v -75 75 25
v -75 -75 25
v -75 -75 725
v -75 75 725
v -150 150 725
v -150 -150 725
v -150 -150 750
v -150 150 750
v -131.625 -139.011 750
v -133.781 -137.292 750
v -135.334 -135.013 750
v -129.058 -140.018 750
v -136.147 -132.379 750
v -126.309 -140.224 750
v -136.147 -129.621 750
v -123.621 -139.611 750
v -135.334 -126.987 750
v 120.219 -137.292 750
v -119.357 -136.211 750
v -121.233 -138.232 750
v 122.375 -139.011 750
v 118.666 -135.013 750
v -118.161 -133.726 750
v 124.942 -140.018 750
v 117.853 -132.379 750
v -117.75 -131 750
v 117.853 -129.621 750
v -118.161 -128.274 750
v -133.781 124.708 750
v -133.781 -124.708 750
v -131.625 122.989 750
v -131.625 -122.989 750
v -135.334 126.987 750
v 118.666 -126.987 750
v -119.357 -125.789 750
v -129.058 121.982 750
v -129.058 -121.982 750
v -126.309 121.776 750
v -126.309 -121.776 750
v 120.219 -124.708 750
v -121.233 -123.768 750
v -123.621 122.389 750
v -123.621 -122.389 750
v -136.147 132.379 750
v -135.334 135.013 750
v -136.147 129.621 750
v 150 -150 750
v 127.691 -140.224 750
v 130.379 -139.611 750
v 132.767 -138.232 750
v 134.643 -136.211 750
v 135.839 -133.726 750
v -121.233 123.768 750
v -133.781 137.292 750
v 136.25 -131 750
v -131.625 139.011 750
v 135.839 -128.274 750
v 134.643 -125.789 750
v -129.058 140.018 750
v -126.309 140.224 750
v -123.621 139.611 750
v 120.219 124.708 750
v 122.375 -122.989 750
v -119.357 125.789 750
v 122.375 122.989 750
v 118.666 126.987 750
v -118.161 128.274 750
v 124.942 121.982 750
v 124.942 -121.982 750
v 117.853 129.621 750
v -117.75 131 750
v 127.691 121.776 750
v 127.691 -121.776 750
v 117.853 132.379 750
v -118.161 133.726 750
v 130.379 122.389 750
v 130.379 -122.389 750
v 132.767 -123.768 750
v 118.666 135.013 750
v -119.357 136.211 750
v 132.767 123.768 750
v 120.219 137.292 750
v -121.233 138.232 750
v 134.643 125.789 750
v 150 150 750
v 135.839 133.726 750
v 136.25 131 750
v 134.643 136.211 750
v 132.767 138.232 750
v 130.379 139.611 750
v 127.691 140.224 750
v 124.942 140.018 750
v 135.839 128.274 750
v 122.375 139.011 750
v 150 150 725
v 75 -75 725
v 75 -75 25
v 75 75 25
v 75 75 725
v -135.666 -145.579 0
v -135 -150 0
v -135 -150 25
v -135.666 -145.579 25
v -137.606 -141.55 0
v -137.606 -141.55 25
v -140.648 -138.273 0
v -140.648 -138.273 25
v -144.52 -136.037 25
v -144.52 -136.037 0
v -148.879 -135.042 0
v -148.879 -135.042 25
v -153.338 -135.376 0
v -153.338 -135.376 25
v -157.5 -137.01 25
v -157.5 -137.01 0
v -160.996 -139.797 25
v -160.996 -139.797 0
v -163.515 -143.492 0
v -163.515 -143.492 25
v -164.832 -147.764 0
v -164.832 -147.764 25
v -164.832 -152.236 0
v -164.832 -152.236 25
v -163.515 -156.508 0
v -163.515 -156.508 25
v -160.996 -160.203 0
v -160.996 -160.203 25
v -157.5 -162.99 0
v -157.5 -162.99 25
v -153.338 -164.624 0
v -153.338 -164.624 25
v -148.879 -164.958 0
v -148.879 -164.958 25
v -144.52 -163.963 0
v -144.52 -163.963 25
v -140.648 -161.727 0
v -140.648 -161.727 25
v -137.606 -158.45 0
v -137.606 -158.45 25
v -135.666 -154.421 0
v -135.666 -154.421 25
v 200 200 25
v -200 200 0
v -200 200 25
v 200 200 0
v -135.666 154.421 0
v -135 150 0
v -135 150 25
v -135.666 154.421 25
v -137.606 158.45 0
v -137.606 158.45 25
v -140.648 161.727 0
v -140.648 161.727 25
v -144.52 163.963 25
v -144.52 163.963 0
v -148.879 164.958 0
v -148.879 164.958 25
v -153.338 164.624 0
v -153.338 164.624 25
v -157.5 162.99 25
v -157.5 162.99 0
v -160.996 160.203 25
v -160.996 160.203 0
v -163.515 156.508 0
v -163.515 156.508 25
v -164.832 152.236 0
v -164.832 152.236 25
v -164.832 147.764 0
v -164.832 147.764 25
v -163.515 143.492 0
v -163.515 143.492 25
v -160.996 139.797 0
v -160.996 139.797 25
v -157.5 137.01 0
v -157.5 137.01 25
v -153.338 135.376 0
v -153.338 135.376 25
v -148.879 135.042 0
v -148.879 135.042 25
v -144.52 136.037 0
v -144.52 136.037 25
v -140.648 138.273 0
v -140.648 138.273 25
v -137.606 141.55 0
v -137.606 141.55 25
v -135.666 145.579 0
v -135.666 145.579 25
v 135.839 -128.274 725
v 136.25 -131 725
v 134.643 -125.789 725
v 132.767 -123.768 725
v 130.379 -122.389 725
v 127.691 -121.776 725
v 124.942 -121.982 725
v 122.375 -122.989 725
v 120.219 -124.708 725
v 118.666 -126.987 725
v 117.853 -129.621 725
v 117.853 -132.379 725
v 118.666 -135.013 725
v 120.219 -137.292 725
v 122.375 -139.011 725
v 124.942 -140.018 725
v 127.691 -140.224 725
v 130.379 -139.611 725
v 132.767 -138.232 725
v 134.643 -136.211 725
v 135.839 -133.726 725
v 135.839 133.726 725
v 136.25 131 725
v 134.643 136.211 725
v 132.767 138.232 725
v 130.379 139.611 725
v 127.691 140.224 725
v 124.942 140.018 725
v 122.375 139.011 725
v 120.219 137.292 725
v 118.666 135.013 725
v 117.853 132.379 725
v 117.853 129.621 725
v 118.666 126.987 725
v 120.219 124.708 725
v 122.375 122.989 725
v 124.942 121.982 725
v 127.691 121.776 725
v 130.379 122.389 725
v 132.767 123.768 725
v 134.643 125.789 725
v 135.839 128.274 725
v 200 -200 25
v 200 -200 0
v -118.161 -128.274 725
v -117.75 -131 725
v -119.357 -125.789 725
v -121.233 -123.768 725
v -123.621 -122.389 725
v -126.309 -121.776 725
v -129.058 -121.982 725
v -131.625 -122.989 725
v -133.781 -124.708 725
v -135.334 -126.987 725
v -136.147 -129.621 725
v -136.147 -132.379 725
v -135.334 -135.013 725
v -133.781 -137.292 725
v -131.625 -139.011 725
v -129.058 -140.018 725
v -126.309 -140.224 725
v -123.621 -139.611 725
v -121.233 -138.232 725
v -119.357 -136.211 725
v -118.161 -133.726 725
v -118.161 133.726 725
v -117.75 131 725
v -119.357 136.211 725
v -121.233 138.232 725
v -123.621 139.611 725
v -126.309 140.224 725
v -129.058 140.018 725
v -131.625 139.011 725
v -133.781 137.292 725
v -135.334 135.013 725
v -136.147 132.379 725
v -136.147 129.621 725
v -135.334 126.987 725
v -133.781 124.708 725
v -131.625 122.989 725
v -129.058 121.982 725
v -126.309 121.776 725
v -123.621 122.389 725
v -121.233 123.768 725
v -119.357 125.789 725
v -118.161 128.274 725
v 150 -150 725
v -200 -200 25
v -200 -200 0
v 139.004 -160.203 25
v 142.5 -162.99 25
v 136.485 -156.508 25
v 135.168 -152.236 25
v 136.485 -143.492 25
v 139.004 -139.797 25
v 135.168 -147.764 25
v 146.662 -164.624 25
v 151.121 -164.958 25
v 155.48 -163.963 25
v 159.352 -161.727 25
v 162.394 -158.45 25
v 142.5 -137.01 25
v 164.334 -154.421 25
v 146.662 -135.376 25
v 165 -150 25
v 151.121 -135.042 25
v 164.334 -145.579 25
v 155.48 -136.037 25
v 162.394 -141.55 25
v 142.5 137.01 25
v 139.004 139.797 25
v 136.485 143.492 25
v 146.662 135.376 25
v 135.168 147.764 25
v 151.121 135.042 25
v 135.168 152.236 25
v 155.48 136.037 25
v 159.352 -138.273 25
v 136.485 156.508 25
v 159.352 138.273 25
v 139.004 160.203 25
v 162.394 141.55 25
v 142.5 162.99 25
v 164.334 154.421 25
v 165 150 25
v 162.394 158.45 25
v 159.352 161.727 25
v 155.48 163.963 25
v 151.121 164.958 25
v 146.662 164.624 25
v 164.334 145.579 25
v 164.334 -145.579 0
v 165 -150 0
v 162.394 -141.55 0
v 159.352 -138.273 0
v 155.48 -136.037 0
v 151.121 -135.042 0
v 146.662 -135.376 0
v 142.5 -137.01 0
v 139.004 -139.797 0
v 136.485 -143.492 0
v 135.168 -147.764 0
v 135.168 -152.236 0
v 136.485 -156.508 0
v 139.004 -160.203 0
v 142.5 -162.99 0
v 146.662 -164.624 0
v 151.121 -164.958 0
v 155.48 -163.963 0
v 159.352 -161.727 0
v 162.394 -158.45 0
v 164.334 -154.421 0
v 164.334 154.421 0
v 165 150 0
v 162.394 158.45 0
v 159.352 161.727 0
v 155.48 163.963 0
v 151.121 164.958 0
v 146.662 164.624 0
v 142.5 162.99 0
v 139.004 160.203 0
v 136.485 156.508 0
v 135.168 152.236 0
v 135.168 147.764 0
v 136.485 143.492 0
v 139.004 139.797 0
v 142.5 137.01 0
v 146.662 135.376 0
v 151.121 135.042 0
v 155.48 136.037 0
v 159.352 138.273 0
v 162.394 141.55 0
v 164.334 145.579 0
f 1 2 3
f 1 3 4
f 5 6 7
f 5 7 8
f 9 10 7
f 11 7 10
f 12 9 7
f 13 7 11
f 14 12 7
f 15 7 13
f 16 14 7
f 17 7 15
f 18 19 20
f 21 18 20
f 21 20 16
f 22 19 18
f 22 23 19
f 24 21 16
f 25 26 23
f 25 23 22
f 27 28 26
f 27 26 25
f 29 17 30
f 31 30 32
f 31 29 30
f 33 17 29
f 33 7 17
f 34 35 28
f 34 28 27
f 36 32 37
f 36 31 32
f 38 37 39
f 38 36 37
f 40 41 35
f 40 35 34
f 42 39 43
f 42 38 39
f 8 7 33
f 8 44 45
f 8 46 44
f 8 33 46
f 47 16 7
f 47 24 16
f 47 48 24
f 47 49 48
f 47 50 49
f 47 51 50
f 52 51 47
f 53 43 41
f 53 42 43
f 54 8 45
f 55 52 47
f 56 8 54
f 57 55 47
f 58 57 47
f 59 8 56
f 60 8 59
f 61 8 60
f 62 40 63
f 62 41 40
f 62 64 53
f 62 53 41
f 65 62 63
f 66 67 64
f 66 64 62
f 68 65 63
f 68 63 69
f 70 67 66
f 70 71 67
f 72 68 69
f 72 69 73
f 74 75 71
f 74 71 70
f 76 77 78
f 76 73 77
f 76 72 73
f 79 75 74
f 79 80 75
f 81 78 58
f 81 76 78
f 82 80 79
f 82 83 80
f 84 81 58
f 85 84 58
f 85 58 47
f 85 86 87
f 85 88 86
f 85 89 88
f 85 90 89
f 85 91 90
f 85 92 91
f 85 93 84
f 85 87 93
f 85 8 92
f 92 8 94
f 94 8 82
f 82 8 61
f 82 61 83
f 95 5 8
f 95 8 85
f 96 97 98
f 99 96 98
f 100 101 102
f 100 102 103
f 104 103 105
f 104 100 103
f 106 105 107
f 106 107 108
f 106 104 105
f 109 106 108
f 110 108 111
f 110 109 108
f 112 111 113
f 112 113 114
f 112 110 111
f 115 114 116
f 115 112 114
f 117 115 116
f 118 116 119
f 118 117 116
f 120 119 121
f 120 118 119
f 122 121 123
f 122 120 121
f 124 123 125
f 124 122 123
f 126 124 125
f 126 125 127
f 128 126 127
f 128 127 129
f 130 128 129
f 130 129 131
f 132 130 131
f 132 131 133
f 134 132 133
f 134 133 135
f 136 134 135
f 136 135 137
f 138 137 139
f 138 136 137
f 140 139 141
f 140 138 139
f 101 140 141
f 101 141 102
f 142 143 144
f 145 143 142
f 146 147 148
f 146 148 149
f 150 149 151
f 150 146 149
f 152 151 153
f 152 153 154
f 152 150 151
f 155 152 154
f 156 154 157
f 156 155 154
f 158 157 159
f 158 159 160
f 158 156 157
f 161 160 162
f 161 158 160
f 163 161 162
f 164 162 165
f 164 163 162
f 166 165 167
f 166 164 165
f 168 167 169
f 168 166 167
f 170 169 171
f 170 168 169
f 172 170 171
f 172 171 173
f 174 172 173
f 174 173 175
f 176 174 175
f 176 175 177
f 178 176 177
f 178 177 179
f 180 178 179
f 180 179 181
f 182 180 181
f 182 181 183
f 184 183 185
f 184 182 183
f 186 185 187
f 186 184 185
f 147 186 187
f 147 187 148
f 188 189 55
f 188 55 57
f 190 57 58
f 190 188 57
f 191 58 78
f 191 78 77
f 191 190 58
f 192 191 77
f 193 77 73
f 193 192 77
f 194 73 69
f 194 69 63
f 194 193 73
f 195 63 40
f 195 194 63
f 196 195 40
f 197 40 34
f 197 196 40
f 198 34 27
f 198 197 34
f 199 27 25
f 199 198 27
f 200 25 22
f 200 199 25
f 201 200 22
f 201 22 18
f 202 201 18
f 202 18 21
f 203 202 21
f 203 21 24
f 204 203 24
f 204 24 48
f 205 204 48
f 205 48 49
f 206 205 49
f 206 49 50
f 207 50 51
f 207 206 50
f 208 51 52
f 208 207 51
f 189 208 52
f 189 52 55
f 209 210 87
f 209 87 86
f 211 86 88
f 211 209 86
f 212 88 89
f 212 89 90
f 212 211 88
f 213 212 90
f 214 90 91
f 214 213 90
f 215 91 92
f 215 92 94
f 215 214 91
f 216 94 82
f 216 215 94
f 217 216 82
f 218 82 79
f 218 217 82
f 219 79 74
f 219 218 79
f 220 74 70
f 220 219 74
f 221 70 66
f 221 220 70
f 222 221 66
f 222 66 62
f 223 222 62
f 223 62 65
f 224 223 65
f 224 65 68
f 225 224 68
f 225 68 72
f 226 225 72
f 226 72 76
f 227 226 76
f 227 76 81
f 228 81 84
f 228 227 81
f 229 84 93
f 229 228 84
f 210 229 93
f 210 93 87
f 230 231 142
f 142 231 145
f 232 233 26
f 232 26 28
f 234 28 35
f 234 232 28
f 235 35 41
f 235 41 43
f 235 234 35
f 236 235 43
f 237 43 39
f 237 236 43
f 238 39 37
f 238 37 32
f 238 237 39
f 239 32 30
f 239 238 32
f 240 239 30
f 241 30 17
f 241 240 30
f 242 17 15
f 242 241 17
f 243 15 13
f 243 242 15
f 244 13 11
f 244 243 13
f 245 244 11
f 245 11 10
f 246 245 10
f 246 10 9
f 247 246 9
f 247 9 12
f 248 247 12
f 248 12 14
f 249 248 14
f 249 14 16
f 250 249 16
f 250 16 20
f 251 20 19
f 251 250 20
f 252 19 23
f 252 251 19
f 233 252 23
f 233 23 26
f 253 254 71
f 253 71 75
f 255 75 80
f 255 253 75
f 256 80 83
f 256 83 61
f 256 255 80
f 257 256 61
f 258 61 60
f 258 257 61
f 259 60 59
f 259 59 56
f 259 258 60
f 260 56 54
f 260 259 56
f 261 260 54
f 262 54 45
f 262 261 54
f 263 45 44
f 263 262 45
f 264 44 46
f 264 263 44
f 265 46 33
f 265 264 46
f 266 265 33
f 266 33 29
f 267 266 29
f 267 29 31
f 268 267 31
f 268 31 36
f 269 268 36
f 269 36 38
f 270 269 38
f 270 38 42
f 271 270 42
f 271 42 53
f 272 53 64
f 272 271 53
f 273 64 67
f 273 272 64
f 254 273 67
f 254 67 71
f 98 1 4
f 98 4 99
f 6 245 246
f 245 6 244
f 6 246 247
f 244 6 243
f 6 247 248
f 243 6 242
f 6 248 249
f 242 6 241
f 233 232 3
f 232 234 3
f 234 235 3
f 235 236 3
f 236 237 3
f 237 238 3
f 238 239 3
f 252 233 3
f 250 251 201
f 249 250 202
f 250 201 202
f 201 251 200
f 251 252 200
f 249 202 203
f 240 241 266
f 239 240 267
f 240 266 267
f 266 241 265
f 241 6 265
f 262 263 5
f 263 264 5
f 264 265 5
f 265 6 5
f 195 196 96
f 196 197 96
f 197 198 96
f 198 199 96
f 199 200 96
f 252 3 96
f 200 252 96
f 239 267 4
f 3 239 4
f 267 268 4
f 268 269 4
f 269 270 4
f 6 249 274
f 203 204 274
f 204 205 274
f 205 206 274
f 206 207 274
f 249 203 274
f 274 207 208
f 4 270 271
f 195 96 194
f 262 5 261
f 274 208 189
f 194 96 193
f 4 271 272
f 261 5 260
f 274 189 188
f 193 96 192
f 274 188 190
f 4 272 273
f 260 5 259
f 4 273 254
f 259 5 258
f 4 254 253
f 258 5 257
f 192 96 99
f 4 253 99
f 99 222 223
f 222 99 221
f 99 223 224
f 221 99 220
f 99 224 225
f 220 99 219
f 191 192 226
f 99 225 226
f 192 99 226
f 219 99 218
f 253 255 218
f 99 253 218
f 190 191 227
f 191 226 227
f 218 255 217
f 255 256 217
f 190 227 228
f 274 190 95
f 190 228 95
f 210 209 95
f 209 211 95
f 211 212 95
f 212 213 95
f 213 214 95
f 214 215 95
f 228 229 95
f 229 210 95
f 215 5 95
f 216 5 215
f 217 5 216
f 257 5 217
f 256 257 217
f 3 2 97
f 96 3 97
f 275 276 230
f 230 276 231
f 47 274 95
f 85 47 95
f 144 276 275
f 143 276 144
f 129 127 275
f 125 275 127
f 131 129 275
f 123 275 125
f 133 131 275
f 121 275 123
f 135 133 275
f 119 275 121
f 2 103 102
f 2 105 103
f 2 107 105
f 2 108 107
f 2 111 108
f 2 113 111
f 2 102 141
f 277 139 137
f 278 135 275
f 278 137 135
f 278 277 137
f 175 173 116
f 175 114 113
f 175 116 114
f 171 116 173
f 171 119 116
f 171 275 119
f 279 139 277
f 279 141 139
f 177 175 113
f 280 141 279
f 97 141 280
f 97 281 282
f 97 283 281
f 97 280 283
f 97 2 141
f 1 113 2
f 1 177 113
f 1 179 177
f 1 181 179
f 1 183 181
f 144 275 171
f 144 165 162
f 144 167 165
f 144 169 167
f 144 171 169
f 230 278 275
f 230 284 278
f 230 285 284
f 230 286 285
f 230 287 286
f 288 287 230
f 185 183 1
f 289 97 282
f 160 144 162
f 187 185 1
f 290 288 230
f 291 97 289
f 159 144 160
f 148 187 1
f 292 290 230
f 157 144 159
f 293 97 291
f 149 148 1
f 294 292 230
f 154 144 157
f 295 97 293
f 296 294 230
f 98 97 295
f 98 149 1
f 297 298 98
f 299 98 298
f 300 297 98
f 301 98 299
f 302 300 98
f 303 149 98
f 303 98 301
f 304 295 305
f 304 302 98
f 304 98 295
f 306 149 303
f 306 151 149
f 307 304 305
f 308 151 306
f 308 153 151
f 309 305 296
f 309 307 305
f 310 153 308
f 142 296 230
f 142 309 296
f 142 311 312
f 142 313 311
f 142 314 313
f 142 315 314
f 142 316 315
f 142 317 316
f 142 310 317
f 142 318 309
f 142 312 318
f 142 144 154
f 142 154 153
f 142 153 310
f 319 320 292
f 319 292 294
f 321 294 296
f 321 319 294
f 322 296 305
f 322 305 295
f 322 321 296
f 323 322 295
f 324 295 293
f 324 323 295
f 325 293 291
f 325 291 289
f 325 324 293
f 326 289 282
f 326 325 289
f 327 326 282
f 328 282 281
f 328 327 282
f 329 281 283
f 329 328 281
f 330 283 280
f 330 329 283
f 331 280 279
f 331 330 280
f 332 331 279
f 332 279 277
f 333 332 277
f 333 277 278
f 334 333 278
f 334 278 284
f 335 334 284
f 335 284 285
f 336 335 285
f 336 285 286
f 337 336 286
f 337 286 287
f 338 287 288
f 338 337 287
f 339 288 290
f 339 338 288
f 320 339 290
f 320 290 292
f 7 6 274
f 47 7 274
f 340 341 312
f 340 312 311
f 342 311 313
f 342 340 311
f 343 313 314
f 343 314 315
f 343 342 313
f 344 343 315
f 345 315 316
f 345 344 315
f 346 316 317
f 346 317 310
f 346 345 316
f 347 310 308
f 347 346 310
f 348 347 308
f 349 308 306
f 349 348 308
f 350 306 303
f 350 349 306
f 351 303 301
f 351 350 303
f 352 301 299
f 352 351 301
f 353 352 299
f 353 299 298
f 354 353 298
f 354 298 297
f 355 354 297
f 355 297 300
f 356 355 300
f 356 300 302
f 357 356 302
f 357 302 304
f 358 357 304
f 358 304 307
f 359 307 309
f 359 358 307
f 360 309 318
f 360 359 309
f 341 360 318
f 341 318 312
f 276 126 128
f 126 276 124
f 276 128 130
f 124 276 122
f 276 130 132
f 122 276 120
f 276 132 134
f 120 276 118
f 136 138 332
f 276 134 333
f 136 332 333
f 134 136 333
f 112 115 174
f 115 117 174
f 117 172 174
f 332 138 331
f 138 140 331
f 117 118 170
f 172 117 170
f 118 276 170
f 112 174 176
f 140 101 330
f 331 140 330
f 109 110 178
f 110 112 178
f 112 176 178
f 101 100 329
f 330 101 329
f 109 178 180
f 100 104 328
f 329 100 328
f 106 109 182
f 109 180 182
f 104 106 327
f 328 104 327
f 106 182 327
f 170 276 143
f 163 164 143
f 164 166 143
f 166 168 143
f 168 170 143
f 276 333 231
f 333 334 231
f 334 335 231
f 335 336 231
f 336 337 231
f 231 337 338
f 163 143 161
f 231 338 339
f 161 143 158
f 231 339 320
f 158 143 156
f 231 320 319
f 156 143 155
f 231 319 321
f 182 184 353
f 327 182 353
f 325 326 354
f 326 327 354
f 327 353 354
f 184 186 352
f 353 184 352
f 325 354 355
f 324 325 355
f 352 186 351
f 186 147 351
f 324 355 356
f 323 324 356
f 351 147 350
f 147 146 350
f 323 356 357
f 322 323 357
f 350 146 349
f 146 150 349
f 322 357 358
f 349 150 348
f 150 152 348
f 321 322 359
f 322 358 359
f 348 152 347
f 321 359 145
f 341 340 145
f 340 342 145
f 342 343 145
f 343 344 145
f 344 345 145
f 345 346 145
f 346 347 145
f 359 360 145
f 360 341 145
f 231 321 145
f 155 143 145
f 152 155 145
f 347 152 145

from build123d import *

# Parameters (mm, degrees)
F0_W     = 400
F0_H     = 400
F0_R     = 15
F1_DEPTH = 25
F2_W     = 150
F2_H     = 150
F3_DEPTH = 700
F4_W     = 300
F4_H     = 300
F4_R     = 9.25
F5_DEPTH = 25


with BuildPart() as f1:
    # F0 (on Top) → F1 (new body)
    with BuildSketch(Plane.XY):
        Rectangle(F0_W, F0_H)
        with Locations((-150, -150)):
            Circle(F0_R, mode=Mode.SUBTRACT)
        with Locations((150, -150)):
            Circle(F0_R, mode=Mode.SUBTRACT)
        with Locations((-150, 150)):
            Circle(F0_R, mode=Mode.SUBTRACT)
        with Locations((150, 150)):
            Circle(F0_R, mode=Mode.SUBTRACT)
    extrude(amount=F1_DEPTH)

    # F2 (on face) → F3 (join)
    with BuildSketch(Plane.XY.offset(25)):
        Rectangle(F2_W, F2_H)
    extrude(amount=F3_DEPTH)

    # F4 (on face) → F5 (join)
    with BuildSketch(Plane.XY.offset(725)):
        Rectangle(F4_W, F4_H)
        with Locations((-127, -131)):
            Circle(F4_R, mode=Mode.SUBTRACT)
        with Locations((127, -131)):
            Circle(F4_R, mode=Mode.SUBTRACT)
        with Locations((-127, 131)):
            Circle(F4_R, mode=Mode.SUBTRACT)
        with Locations((127, 131)):
            Circle(F4_R, mode=Mode.SUBTRACT)
    extrude(amount=F5_DEPTH)


solid = f1.part
